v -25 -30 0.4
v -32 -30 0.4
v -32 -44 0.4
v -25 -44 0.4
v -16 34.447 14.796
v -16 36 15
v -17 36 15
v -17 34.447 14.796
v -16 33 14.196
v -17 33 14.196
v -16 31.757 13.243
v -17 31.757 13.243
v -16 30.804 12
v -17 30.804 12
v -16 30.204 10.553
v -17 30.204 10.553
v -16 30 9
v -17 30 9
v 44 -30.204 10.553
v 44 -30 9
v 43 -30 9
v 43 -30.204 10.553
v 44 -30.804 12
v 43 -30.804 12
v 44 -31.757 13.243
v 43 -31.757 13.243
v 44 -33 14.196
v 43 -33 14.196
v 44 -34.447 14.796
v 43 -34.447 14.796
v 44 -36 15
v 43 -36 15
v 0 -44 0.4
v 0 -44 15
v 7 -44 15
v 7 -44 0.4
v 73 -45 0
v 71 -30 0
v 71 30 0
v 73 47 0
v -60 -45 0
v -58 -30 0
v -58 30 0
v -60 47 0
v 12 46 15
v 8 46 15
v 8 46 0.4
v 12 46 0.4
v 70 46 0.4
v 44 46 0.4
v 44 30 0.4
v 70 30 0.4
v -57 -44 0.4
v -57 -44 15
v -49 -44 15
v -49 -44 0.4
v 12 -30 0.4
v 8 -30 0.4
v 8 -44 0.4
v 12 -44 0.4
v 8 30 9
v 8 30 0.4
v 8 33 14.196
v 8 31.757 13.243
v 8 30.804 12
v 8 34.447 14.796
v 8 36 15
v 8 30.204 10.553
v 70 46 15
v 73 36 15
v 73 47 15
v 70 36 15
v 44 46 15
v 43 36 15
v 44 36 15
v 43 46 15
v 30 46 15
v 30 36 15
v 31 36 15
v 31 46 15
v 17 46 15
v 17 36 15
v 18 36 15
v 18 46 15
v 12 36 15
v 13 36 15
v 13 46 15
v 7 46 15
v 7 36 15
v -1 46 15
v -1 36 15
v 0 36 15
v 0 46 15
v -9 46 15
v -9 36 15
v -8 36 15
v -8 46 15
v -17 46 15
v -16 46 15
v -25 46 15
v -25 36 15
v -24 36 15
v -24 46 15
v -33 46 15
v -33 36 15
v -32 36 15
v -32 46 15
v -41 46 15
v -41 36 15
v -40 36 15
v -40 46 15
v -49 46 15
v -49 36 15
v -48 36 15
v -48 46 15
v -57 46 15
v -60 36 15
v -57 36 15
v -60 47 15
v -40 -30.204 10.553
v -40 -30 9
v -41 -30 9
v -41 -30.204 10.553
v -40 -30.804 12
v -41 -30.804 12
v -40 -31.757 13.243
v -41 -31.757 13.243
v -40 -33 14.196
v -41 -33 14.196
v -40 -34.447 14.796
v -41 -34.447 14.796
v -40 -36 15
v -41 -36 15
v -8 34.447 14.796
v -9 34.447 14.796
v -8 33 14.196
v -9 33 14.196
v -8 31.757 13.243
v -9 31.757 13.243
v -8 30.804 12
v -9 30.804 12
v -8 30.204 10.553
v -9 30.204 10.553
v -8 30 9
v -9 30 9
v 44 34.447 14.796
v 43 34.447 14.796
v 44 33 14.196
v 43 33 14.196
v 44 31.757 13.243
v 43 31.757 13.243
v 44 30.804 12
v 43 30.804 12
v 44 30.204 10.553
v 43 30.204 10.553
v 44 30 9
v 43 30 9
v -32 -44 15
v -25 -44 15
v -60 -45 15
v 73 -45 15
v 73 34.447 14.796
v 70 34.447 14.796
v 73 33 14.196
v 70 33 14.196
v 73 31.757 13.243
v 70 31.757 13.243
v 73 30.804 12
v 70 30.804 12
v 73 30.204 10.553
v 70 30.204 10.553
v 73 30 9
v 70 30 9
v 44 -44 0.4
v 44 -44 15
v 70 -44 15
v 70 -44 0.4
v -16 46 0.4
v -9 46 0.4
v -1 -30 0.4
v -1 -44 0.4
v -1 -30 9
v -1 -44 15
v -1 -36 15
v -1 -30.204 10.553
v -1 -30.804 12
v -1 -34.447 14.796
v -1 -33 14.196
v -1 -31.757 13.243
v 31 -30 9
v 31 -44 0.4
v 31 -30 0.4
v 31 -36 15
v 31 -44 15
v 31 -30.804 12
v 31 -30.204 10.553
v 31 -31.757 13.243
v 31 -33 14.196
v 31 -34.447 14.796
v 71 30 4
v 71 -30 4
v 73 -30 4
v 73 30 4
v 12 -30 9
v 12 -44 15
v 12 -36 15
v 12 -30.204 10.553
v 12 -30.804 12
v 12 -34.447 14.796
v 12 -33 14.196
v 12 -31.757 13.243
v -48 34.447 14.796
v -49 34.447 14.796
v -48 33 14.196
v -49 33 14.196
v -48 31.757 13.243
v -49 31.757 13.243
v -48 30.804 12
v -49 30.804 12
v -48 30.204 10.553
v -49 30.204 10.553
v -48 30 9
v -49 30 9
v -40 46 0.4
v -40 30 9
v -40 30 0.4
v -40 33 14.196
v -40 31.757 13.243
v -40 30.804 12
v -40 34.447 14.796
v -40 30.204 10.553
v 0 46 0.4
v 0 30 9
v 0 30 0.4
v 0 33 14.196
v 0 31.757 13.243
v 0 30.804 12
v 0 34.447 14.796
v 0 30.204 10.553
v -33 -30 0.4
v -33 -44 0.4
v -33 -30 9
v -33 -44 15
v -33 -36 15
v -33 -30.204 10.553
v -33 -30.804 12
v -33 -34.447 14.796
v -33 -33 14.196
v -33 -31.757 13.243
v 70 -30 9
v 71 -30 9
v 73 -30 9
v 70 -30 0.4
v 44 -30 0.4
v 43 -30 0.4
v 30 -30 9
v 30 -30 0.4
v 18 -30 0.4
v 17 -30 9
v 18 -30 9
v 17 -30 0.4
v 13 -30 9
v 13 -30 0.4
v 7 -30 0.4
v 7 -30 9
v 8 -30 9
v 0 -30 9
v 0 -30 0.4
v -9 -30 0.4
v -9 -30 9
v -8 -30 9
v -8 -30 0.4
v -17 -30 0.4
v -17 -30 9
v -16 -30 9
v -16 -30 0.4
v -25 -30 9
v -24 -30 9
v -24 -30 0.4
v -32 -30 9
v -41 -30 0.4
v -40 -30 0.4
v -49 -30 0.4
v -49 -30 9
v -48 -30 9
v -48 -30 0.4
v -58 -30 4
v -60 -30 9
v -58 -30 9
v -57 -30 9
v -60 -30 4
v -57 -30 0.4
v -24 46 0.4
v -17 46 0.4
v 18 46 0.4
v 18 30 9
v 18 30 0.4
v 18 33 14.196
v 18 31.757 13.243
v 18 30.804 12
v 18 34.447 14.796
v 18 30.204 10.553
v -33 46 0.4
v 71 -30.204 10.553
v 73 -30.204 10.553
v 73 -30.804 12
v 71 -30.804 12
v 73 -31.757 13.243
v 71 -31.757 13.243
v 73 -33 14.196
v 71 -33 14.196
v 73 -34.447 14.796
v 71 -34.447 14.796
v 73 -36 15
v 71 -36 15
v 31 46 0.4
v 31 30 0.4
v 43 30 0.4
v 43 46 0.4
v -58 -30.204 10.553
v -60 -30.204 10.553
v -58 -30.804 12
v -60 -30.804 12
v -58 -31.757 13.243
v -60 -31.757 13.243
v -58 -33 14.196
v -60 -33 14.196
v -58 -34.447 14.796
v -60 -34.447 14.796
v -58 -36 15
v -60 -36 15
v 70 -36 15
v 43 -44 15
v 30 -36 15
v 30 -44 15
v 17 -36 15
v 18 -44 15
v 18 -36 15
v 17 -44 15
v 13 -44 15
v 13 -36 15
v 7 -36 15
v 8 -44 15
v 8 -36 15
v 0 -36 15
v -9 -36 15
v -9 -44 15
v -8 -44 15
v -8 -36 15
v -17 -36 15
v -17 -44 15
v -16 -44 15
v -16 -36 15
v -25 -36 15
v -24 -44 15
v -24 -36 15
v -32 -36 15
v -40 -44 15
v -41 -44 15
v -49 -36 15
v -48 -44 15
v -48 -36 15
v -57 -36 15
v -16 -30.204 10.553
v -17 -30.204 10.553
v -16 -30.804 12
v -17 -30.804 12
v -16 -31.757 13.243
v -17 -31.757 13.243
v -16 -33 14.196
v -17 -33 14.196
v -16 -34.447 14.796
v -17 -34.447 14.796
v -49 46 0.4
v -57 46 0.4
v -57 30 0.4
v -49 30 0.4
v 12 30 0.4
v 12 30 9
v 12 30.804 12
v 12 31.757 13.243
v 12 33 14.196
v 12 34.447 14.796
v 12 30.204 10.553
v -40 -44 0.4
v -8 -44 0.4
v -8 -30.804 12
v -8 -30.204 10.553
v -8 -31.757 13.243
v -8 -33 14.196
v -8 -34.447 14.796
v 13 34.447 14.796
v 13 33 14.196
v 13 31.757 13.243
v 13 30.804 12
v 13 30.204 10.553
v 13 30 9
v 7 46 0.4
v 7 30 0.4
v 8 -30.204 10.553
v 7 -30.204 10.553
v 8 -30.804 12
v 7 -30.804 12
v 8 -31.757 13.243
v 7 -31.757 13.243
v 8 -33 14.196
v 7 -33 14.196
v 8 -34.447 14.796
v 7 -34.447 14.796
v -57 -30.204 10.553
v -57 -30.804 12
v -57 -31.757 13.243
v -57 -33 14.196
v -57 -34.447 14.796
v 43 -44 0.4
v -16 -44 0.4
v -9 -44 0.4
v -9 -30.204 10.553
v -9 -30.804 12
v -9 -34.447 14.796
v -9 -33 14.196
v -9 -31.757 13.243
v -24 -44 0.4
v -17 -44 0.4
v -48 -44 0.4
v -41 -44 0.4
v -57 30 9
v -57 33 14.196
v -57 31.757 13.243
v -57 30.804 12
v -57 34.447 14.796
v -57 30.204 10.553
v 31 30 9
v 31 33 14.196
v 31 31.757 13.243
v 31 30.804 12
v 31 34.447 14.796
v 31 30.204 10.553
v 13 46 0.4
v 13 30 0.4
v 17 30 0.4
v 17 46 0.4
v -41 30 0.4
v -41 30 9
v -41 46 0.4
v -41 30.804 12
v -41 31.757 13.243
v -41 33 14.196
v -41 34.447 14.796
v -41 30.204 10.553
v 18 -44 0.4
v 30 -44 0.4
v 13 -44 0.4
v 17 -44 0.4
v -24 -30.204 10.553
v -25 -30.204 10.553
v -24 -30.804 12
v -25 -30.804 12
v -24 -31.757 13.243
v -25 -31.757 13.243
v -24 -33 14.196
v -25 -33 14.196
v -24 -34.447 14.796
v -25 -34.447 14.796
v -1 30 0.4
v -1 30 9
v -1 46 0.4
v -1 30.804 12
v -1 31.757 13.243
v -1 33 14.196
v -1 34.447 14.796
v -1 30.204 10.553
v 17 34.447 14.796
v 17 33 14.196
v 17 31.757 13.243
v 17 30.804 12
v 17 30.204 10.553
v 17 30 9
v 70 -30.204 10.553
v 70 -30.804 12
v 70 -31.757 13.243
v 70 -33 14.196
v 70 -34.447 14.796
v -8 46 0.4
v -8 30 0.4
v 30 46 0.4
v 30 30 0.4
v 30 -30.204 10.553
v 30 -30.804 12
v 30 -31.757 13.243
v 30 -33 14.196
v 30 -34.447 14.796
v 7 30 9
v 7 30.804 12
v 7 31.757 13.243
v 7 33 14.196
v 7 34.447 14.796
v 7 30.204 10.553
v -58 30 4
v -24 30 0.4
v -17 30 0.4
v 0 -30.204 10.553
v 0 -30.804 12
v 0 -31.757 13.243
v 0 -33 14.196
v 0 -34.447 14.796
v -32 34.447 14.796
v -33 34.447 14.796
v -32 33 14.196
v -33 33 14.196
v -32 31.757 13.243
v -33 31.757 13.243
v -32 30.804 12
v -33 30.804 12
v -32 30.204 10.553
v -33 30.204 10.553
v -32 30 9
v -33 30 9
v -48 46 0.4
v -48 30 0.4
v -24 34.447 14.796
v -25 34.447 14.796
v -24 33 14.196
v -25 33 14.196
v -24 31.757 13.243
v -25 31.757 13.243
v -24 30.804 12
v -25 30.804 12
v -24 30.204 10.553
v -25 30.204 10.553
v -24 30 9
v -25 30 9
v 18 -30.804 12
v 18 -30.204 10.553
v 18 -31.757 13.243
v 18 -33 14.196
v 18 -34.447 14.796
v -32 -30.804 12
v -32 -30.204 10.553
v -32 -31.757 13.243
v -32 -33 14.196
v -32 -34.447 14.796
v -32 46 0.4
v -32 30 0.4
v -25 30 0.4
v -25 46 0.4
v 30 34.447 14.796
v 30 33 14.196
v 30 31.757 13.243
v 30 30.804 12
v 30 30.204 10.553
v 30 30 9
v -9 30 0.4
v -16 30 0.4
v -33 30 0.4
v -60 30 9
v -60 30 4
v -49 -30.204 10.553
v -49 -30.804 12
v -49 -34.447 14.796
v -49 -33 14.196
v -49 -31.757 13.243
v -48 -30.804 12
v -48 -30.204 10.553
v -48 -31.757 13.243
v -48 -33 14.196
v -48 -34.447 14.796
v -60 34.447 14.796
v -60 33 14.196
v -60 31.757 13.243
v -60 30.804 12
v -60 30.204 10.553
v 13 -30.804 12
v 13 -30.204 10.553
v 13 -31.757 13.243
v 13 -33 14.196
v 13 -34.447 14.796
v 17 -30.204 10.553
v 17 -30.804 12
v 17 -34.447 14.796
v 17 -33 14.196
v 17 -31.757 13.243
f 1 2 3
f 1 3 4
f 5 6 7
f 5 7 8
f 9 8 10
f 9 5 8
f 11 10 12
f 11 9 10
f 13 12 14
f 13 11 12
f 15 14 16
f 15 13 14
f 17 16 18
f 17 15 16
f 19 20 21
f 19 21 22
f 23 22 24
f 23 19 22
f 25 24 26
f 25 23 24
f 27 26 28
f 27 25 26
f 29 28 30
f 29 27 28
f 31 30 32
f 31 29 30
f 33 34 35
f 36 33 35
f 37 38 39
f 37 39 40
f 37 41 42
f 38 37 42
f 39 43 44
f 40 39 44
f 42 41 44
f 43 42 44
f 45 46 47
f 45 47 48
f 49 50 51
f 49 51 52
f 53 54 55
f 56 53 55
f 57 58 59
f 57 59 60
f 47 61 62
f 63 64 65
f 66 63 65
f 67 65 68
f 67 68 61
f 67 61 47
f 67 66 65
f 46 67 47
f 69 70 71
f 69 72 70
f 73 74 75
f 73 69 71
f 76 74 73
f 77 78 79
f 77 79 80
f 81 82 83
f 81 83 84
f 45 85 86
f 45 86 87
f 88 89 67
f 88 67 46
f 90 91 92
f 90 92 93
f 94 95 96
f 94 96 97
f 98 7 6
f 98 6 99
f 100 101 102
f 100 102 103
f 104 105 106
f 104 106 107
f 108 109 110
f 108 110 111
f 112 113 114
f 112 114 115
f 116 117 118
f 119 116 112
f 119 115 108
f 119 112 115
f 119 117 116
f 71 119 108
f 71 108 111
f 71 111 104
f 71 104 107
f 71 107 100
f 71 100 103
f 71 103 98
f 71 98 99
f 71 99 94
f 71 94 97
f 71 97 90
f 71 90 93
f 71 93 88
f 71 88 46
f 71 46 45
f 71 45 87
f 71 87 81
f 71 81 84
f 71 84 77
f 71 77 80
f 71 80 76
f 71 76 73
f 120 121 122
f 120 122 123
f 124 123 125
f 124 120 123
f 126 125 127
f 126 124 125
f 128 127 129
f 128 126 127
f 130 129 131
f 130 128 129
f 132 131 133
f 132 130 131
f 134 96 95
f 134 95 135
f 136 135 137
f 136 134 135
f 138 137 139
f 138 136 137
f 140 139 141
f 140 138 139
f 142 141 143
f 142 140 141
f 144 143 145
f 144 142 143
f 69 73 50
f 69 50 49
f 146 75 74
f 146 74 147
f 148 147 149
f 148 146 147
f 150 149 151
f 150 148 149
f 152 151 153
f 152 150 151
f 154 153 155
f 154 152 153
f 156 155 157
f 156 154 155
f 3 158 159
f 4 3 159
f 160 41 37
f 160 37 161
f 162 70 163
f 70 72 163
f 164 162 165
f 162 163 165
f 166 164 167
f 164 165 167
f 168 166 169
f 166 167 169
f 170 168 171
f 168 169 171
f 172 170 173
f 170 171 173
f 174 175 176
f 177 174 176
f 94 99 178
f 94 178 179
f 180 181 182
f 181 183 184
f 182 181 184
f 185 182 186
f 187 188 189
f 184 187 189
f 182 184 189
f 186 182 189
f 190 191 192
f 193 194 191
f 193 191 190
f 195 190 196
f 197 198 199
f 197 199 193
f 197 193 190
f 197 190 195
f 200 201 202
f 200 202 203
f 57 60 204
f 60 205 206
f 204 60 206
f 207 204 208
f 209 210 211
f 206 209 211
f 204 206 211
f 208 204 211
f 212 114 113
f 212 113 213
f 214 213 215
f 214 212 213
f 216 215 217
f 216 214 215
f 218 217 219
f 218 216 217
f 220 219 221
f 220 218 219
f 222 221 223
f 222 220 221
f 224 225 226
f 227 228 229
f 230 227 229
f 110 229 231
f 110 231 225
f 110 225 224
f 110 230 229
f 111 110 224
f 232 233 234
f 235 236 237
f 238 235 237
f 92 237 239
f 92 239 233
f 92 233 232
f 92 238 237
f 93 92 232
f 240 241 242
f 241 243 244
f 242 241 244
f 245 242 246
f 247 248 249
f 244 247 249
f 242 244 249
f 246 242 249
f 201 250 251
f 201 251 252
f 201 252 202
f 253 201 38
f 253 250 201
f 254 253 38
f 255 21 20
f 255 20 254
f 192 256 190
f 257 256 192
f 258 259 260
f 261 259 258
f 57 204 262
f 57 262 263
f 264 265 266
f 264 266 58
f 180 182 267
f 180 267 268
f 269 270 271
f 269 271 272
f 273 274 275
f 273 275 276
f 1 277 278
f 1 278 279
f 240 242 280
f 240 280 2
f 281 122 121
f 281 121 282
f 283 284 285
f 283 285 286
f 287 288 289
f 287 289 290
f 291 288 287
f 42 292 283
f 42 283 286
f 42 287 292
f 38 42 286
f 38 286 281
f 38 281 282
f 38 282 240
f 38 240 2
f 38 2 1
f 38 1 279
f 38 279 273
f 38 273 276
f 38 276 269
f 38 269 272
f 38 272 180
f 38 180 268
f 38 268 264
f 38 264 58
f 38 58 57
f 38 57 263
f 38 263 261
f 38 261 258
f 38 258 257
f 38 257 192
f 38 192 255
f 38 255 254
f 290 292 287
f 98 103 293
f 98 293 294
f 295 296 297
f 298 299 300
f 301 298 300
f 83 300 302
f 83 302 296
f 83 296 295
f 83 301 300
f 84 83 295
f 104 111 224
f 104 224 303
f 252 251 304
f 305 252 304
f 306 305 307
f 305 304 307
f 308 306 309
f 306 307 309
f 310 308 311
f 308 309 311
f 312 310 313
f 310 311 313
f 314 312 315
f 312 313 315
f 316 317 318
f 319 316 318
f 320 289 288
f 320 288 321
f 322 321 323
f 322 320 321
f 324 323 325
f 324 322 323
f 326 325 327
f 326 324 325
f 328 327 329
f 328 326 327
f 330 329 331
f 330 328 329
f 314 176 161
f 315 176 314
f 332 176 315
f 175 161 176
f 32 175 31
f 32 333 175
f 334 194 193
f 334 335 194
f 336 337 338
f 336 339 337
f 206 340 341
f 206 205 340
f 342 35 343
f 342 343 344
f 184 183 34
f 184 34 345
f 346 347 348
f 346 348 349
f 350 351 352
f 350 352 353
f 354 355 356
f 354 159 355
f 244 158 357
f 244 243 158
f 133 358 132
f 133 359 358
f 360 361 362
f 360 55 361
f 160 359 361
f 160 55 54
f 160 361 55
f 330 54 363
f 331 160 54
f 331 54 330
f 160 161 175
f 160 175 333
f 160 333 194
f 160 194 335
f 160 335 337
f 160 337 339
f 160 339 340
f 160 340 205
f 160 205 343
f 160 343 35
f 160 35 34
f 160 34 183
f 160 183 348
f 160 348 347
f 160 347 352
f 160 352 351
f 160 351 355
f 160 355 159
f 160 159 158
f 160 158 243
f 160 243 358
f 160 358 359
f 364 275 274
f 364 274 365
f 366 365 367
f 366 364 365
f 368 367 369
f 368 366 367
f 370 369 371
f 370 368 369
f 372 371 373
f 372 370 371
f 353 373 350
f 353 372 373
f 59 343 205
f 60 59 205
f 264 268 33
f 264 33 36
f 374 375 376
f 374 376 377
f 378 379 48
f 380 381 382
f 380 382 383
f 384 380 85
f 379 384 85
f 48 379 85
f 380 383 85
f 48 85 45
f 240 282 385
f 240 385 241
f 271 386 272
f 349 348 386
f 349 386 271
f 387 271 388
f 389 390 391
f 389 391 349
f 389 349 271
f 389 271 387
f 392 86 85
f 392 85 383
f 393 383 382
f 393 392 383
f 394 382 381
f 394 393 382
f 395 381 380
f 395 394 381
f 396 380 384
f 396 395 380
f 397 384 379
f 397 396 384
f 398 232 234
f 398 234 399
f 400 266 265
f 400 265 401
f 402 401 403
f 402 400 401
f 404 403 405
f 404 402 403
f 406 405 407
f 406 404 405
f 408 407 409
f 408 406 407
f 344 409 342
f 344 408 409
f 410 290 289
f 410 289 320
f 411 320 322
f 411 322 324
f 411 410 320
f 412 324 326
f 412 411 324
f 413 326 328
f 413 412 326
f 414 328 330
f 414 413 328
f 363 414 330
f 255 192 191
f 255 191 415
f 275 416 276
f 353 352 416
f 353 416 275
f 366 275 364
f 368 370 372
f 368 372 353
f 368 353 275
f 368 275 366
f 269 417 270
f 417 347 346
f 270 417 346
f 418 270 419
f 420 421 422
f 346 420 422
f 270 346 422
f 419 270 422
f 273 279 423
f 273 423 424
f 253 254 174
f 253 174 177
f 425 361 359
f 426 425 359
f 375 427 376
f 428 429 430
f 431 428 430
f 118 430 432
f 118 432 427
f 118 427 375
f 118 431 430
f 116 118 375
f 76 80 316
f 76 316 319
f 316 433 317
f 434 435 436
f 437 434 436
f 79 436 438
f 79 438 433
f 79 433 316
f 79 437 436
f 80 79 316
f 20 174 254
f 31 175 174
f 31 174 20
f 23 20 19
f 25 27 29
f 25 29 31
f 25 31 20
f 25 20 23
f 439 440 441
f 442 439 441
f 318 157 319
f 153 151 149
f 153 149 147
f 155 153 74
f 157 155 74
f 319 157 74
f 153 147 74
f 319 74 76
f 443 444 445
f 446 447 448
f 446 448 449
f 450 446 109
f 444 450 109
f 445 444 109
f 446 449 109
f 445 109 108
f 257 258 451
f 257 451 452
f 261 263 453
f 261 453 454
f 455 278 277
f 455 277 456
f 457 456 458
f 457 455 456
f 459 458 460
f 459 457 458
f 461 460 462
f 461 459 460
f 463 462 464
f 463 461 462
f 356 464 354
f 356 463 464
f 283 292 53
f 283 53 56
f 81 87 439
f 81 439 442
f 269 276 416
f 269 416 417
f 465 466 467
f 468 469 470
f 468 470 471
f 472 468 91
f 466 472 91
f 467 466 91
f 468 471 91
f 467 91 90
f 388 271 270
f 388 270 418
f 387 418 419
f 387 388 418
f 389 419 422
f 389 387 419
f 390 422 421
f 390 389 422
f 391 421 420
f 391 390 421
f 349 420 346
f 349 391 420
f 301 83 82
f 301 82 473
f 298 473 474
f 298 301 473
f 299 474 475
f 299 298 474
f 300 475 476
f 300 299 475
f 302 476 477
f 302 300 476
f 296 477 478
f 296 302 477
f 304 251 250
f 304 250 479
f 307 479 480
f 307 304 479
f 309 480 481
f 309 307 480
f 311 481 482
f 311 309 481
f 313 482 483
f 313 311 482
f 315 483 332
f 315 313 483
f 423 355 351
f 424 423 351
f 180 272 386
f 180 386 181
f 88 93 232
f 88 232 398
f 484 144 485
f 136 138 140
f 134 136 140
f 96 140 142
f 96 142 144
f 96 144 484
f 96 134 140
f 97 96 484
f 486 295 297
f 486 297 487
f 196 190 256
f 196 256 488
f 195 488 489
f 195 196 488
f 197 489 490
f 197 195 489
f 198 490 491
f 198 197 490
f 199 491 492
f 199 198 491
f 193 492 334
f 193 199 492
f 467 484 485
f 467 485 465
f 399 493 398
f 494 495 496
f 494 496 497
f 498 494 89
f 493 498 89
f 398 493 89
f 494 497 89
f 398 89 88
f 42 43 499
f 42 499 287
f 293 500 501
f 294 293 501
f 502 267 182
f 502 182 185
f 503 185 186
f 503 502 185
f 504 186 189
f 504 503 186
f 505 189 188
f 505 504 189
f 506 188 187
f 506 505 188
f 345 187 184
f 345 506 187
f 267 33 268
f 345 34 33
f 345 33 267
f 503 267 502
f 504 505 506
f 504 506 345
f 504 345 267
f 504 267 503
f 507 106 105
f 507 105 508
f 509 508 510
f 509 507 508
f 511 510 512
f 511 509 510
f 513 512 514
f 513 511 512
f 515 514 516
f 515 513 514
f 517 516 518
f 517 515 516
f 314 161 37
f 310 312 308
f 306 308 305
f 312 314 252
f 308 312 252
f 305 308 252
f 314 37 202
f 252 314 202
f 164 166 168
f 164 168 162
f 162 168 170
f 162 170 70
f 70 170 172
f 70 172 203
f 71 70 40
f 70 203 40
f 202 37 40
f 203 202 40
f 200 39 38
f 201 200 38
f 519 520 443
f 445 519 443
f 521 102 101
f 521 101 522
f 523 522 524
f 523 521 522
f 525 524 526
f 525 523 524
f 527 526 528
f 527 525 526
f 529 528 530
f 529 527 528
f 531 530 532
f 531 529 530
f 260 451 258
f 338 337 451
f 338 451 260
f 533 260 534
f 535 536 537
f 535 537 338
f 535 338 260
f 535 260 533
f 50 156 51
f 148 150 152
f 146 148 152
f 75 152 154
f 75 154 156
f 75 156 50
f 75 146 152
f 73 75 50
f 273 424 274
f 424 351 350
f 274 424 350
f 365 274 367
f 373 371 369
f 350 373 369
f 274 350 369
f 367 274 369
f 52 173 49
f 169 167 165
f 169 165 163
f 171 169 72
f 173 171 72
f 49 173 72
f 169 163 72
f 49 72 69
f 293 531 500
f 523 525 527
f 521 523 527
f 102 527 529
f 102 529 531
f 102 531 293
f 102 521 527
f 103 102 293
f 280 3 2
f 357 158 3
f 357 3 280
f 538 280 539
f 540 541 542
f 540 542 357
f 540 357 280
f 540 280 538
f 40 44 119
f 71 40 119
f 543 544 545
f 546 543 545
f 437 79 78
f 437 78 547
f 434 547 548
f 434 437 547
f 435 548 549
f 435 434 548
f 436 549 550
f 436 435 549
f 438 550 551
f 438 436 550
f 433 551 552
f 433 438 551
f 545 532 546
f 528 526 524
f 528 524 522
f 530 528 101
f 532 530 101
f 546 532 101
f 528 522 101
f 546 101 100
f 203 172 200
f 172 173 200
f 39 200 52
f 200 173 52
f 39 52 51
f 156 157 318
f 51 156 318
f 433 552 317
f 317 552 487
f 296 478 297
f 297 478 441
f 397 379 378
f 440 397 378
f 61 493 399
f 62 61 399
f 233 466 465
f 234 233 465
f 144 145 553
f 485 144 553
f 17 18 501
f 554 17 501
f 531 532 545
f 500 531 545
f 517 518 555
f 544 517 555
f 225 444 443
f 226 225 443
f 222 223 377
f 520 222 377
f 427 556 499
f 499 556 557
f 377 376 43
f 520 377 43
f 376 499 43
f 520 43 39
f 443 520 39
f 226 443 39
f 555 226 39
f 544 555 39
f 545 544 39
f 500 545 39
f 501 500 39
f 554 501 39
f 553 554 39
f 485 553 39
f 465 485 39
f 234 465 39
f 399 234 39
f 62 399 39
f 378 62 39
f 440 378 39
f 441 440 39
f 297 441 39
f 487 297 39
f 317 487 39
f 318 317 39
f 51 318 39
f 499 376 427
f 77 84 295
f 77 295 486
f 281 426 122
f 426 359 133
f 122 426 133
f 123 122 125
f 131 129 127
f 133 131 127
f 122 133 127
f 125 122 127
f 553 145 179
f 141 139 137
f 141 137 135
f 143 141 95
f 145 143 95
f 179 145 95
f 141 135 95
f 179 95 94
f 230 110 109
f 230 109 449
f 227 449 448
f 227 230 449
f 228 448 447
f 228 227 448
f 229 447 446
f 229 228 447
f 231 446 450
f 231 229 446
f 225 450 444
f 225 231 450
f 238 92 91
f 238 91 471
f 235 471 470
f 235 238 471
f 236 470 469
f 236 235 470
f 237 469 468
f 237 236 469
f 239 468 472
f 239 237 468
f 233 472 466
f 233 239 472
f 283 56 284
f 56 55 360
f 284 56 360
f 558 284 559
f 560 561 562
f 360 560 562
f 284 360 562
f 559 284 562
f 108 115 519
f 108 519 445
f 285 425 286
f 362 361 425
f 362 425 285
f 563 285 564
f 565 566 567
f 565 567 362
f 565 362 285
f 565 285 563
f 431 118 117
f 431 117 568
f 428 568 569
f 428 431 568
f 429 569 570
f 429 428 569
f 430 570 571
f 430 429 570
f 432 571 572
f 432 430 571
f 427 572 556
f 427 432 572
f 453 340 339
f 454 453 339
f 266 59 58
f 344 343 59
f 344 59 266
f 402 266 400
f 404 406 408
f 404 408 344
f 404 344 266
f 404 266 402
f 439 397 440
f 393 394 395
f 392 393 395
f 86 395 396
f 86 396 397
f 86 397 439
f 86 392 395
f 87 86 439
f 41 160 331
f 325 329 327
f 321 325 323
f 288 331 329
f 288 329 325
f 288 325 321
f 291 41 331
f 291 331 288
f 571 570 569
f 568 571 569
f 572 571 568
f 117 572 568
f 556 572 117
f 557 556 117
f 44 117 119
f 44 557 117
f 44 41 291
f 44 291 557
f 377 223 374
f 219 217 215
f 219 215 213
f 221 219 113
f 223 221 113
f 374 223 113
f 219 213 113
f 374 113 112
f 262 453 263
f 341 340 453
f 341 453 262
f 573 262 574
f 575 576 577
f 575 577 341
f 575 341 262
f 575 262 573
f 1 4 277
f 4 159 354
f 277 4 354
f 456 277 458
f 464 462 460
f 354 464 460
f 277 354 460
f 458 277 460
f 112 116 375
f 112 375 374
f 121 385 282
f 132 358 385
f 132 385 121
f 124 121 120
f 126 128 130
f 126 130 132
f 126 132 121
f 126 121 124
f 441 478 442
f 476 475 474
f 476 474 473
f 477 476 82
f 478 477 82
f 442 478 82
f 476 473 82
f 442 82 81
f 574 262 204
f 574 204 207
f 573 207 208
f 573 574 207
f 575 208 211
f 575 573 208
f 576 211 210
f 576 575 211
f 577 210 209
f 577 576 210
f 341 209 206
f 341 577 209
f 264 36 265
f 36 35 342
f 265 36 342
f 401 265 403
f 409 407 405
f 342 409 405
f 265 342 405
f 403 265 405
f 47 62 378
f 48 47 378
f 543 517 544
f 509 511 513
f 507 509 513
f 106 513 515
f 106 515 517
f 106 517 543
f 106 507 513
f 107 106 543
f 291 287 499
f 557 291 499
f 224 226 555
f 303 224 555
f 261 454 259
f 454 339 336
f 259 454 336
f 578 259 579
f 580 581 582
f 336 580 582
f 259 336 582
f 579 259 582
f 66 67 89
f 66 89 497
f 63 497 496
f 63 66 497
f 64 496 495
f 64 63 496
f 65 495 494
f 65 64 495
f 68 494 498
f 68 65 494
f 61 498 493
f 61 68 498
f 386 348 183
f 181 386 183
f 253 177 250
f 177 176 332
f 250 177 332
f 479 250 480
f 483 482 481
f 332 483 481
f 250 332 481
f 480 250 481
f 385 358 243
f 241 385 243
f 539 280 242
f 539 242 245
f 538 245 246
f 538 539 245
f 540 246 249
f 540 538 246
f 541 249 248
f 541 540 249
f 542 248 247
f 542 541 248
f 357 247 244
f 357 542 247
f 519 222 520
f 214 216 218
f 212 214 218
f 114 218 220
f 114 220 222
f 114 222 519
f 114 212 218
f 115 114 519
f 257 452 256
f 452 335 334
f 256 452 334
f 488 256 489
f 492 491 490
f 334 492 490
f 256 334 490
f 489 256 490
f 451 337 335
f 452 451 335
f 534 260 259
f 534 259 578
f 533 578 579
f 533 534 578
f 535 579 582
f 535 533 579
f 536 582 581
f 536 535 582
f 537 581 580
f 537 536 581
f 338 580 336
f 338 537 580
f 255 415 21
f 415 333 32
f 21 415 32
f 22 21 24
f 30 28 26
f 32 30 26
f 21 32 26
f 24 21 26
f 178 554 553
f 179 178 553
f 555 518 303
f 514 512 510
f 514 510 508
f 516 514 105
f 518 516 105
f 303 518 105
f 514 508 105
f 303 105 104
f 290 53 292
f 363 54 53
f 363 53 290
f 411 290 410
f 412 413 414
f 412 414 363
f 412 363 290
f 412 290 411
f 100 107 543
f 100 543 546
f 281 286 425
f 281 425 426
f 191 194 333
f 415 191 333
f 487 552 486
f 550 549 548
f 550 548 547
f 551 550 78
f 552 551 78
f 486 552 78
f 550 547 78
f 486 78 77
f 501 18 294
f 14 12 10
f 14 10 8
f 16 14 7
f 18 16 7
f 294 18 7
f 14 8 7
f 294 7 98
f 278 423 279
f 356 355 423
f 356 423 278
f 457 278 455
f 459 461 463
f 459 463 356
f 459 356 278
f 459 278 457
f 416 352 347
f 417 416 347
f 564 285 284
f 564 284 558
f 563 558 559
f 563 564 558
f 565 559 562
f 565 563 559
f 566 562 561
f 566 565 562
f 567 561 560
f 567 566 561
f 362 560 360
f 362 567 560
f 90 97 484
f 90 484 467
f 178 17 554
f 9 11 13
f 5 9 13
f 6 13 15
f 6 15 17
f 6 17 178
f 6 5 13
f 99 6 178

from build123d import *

# Parameters (mm, degrees)
F1_W      = 129
F1_H      = 92
F2_DEPTH  = 15
F4_W      = 129
F4_H      = 60
F5_DEPTH  = 11
F6_R      = 6
F3_W      = 8
F3_H      = 90
F3_W_2    = 7
F3_W_3    = 4
F3_W_4    = 12
F3_W_5    = 26
F7_DEPTH  = 14.6
F8_DEPTH  = 2
F9_DEPTH  = 2
F10_W     = 129
F10_H     = 60
F11_DEPTH = 25


with BuildPart() as f2:
    # F1 (on Top) → F2 (new body)
    with BuildSketch(Plane.XY):
        with Locations((6.5, 1)):
            Rectangle(F1_W, F1_H)
    extrude(amount=F2_DEPTH)

    # F4 (on face) → F5 (cut)
    with BuildSketch(Plane.XY.offset(15)):
        with Locations((6.5, 0)):
            Rectangle(F4_W, F4_H)
    extrude(amount=-F5_DEPTH, mode=Mode.SUBTRACT)

    # F6
    f6_edges = [f2.edges().sort_by_distance(p)[0] for p in [
        (6.5, 30, 15),
        (6.5, -30, 15),
    ]]
    fillet(f6_edges, radius=F6_R)

    # F3 (on face) → F7 (cut)
    with BuildSketch(Plane.XY.offset(15)):
        with Locations((-53, 1)):
            Rectangle(F3_W, F3_H)
        with Locations((-44.5, 1)):
            Rectangle(F3_W_2, F3_H)
        with Locations((-36.5, 1)):
            Rectangle(F3_W_2, F3_H)
        with Locations((-28.5, 1)):
            Rectangle(F3_W_2, F3_H)
        with Locations((-20.5, 1)):
            Rectangle(F3_W_2, F3_H)
        with Locations((-12.5, 1)):
            Rectangle(F3_W_2, F3_H)
        with Locations((-4.5, 1)):
            Rectangle(F3_W_2, F3_H)
        with Locations((3.5, 1)):
            Rectangle(F3_W_2, F3_H)
        with Locations((10, 1)):
            Rectangle(F3_W_3, F3_H)
        with Locations((15, 1)):
            Rectangle(F3_W_3, F3_H)
        with Locations((24, 1)):
            Rectangle(F3_W_4, F3_H)
        with Locations((37, 1)):
            Rectangle(F3_W_4, F3_H)
        with Locations((57, 1)):
            Rectangle(F3_W_5, F3_H)
    extrude(amount=-F7_DEPTH, mode=Mode.SUBTRACT)

    # F8 (add): a face of the model
    f8_faces = [f2.faces().sort_by_distance(p)[0] for p in [
        (-58, -40.5, 14.0678519431),
    ]]
    extrude(f8_faces, amount=F8_DEPTH)

    # F9 (add): a face of the model
    f9_faces = [f2.faces().sort_by_distance(p)[0] for p in [
        (71, 41.5, 14.0678519431),
    ]]
    extrude(f9_faces, amount=F9_DEPTH)

    # F10 (on face) → F11 (cut)
    with BuildSketch(Plane(origin=(0, 0, 0), x_dir=(1, 0, 0), z_dir=(0, 0, -1))):
        with Locations((6.5, 0)):
            Rectangle(F10_W, F10_H)
    extrude(amount=-F11_DEPTH, mode=Mode.SUBTRACT)


solid = f2.part
